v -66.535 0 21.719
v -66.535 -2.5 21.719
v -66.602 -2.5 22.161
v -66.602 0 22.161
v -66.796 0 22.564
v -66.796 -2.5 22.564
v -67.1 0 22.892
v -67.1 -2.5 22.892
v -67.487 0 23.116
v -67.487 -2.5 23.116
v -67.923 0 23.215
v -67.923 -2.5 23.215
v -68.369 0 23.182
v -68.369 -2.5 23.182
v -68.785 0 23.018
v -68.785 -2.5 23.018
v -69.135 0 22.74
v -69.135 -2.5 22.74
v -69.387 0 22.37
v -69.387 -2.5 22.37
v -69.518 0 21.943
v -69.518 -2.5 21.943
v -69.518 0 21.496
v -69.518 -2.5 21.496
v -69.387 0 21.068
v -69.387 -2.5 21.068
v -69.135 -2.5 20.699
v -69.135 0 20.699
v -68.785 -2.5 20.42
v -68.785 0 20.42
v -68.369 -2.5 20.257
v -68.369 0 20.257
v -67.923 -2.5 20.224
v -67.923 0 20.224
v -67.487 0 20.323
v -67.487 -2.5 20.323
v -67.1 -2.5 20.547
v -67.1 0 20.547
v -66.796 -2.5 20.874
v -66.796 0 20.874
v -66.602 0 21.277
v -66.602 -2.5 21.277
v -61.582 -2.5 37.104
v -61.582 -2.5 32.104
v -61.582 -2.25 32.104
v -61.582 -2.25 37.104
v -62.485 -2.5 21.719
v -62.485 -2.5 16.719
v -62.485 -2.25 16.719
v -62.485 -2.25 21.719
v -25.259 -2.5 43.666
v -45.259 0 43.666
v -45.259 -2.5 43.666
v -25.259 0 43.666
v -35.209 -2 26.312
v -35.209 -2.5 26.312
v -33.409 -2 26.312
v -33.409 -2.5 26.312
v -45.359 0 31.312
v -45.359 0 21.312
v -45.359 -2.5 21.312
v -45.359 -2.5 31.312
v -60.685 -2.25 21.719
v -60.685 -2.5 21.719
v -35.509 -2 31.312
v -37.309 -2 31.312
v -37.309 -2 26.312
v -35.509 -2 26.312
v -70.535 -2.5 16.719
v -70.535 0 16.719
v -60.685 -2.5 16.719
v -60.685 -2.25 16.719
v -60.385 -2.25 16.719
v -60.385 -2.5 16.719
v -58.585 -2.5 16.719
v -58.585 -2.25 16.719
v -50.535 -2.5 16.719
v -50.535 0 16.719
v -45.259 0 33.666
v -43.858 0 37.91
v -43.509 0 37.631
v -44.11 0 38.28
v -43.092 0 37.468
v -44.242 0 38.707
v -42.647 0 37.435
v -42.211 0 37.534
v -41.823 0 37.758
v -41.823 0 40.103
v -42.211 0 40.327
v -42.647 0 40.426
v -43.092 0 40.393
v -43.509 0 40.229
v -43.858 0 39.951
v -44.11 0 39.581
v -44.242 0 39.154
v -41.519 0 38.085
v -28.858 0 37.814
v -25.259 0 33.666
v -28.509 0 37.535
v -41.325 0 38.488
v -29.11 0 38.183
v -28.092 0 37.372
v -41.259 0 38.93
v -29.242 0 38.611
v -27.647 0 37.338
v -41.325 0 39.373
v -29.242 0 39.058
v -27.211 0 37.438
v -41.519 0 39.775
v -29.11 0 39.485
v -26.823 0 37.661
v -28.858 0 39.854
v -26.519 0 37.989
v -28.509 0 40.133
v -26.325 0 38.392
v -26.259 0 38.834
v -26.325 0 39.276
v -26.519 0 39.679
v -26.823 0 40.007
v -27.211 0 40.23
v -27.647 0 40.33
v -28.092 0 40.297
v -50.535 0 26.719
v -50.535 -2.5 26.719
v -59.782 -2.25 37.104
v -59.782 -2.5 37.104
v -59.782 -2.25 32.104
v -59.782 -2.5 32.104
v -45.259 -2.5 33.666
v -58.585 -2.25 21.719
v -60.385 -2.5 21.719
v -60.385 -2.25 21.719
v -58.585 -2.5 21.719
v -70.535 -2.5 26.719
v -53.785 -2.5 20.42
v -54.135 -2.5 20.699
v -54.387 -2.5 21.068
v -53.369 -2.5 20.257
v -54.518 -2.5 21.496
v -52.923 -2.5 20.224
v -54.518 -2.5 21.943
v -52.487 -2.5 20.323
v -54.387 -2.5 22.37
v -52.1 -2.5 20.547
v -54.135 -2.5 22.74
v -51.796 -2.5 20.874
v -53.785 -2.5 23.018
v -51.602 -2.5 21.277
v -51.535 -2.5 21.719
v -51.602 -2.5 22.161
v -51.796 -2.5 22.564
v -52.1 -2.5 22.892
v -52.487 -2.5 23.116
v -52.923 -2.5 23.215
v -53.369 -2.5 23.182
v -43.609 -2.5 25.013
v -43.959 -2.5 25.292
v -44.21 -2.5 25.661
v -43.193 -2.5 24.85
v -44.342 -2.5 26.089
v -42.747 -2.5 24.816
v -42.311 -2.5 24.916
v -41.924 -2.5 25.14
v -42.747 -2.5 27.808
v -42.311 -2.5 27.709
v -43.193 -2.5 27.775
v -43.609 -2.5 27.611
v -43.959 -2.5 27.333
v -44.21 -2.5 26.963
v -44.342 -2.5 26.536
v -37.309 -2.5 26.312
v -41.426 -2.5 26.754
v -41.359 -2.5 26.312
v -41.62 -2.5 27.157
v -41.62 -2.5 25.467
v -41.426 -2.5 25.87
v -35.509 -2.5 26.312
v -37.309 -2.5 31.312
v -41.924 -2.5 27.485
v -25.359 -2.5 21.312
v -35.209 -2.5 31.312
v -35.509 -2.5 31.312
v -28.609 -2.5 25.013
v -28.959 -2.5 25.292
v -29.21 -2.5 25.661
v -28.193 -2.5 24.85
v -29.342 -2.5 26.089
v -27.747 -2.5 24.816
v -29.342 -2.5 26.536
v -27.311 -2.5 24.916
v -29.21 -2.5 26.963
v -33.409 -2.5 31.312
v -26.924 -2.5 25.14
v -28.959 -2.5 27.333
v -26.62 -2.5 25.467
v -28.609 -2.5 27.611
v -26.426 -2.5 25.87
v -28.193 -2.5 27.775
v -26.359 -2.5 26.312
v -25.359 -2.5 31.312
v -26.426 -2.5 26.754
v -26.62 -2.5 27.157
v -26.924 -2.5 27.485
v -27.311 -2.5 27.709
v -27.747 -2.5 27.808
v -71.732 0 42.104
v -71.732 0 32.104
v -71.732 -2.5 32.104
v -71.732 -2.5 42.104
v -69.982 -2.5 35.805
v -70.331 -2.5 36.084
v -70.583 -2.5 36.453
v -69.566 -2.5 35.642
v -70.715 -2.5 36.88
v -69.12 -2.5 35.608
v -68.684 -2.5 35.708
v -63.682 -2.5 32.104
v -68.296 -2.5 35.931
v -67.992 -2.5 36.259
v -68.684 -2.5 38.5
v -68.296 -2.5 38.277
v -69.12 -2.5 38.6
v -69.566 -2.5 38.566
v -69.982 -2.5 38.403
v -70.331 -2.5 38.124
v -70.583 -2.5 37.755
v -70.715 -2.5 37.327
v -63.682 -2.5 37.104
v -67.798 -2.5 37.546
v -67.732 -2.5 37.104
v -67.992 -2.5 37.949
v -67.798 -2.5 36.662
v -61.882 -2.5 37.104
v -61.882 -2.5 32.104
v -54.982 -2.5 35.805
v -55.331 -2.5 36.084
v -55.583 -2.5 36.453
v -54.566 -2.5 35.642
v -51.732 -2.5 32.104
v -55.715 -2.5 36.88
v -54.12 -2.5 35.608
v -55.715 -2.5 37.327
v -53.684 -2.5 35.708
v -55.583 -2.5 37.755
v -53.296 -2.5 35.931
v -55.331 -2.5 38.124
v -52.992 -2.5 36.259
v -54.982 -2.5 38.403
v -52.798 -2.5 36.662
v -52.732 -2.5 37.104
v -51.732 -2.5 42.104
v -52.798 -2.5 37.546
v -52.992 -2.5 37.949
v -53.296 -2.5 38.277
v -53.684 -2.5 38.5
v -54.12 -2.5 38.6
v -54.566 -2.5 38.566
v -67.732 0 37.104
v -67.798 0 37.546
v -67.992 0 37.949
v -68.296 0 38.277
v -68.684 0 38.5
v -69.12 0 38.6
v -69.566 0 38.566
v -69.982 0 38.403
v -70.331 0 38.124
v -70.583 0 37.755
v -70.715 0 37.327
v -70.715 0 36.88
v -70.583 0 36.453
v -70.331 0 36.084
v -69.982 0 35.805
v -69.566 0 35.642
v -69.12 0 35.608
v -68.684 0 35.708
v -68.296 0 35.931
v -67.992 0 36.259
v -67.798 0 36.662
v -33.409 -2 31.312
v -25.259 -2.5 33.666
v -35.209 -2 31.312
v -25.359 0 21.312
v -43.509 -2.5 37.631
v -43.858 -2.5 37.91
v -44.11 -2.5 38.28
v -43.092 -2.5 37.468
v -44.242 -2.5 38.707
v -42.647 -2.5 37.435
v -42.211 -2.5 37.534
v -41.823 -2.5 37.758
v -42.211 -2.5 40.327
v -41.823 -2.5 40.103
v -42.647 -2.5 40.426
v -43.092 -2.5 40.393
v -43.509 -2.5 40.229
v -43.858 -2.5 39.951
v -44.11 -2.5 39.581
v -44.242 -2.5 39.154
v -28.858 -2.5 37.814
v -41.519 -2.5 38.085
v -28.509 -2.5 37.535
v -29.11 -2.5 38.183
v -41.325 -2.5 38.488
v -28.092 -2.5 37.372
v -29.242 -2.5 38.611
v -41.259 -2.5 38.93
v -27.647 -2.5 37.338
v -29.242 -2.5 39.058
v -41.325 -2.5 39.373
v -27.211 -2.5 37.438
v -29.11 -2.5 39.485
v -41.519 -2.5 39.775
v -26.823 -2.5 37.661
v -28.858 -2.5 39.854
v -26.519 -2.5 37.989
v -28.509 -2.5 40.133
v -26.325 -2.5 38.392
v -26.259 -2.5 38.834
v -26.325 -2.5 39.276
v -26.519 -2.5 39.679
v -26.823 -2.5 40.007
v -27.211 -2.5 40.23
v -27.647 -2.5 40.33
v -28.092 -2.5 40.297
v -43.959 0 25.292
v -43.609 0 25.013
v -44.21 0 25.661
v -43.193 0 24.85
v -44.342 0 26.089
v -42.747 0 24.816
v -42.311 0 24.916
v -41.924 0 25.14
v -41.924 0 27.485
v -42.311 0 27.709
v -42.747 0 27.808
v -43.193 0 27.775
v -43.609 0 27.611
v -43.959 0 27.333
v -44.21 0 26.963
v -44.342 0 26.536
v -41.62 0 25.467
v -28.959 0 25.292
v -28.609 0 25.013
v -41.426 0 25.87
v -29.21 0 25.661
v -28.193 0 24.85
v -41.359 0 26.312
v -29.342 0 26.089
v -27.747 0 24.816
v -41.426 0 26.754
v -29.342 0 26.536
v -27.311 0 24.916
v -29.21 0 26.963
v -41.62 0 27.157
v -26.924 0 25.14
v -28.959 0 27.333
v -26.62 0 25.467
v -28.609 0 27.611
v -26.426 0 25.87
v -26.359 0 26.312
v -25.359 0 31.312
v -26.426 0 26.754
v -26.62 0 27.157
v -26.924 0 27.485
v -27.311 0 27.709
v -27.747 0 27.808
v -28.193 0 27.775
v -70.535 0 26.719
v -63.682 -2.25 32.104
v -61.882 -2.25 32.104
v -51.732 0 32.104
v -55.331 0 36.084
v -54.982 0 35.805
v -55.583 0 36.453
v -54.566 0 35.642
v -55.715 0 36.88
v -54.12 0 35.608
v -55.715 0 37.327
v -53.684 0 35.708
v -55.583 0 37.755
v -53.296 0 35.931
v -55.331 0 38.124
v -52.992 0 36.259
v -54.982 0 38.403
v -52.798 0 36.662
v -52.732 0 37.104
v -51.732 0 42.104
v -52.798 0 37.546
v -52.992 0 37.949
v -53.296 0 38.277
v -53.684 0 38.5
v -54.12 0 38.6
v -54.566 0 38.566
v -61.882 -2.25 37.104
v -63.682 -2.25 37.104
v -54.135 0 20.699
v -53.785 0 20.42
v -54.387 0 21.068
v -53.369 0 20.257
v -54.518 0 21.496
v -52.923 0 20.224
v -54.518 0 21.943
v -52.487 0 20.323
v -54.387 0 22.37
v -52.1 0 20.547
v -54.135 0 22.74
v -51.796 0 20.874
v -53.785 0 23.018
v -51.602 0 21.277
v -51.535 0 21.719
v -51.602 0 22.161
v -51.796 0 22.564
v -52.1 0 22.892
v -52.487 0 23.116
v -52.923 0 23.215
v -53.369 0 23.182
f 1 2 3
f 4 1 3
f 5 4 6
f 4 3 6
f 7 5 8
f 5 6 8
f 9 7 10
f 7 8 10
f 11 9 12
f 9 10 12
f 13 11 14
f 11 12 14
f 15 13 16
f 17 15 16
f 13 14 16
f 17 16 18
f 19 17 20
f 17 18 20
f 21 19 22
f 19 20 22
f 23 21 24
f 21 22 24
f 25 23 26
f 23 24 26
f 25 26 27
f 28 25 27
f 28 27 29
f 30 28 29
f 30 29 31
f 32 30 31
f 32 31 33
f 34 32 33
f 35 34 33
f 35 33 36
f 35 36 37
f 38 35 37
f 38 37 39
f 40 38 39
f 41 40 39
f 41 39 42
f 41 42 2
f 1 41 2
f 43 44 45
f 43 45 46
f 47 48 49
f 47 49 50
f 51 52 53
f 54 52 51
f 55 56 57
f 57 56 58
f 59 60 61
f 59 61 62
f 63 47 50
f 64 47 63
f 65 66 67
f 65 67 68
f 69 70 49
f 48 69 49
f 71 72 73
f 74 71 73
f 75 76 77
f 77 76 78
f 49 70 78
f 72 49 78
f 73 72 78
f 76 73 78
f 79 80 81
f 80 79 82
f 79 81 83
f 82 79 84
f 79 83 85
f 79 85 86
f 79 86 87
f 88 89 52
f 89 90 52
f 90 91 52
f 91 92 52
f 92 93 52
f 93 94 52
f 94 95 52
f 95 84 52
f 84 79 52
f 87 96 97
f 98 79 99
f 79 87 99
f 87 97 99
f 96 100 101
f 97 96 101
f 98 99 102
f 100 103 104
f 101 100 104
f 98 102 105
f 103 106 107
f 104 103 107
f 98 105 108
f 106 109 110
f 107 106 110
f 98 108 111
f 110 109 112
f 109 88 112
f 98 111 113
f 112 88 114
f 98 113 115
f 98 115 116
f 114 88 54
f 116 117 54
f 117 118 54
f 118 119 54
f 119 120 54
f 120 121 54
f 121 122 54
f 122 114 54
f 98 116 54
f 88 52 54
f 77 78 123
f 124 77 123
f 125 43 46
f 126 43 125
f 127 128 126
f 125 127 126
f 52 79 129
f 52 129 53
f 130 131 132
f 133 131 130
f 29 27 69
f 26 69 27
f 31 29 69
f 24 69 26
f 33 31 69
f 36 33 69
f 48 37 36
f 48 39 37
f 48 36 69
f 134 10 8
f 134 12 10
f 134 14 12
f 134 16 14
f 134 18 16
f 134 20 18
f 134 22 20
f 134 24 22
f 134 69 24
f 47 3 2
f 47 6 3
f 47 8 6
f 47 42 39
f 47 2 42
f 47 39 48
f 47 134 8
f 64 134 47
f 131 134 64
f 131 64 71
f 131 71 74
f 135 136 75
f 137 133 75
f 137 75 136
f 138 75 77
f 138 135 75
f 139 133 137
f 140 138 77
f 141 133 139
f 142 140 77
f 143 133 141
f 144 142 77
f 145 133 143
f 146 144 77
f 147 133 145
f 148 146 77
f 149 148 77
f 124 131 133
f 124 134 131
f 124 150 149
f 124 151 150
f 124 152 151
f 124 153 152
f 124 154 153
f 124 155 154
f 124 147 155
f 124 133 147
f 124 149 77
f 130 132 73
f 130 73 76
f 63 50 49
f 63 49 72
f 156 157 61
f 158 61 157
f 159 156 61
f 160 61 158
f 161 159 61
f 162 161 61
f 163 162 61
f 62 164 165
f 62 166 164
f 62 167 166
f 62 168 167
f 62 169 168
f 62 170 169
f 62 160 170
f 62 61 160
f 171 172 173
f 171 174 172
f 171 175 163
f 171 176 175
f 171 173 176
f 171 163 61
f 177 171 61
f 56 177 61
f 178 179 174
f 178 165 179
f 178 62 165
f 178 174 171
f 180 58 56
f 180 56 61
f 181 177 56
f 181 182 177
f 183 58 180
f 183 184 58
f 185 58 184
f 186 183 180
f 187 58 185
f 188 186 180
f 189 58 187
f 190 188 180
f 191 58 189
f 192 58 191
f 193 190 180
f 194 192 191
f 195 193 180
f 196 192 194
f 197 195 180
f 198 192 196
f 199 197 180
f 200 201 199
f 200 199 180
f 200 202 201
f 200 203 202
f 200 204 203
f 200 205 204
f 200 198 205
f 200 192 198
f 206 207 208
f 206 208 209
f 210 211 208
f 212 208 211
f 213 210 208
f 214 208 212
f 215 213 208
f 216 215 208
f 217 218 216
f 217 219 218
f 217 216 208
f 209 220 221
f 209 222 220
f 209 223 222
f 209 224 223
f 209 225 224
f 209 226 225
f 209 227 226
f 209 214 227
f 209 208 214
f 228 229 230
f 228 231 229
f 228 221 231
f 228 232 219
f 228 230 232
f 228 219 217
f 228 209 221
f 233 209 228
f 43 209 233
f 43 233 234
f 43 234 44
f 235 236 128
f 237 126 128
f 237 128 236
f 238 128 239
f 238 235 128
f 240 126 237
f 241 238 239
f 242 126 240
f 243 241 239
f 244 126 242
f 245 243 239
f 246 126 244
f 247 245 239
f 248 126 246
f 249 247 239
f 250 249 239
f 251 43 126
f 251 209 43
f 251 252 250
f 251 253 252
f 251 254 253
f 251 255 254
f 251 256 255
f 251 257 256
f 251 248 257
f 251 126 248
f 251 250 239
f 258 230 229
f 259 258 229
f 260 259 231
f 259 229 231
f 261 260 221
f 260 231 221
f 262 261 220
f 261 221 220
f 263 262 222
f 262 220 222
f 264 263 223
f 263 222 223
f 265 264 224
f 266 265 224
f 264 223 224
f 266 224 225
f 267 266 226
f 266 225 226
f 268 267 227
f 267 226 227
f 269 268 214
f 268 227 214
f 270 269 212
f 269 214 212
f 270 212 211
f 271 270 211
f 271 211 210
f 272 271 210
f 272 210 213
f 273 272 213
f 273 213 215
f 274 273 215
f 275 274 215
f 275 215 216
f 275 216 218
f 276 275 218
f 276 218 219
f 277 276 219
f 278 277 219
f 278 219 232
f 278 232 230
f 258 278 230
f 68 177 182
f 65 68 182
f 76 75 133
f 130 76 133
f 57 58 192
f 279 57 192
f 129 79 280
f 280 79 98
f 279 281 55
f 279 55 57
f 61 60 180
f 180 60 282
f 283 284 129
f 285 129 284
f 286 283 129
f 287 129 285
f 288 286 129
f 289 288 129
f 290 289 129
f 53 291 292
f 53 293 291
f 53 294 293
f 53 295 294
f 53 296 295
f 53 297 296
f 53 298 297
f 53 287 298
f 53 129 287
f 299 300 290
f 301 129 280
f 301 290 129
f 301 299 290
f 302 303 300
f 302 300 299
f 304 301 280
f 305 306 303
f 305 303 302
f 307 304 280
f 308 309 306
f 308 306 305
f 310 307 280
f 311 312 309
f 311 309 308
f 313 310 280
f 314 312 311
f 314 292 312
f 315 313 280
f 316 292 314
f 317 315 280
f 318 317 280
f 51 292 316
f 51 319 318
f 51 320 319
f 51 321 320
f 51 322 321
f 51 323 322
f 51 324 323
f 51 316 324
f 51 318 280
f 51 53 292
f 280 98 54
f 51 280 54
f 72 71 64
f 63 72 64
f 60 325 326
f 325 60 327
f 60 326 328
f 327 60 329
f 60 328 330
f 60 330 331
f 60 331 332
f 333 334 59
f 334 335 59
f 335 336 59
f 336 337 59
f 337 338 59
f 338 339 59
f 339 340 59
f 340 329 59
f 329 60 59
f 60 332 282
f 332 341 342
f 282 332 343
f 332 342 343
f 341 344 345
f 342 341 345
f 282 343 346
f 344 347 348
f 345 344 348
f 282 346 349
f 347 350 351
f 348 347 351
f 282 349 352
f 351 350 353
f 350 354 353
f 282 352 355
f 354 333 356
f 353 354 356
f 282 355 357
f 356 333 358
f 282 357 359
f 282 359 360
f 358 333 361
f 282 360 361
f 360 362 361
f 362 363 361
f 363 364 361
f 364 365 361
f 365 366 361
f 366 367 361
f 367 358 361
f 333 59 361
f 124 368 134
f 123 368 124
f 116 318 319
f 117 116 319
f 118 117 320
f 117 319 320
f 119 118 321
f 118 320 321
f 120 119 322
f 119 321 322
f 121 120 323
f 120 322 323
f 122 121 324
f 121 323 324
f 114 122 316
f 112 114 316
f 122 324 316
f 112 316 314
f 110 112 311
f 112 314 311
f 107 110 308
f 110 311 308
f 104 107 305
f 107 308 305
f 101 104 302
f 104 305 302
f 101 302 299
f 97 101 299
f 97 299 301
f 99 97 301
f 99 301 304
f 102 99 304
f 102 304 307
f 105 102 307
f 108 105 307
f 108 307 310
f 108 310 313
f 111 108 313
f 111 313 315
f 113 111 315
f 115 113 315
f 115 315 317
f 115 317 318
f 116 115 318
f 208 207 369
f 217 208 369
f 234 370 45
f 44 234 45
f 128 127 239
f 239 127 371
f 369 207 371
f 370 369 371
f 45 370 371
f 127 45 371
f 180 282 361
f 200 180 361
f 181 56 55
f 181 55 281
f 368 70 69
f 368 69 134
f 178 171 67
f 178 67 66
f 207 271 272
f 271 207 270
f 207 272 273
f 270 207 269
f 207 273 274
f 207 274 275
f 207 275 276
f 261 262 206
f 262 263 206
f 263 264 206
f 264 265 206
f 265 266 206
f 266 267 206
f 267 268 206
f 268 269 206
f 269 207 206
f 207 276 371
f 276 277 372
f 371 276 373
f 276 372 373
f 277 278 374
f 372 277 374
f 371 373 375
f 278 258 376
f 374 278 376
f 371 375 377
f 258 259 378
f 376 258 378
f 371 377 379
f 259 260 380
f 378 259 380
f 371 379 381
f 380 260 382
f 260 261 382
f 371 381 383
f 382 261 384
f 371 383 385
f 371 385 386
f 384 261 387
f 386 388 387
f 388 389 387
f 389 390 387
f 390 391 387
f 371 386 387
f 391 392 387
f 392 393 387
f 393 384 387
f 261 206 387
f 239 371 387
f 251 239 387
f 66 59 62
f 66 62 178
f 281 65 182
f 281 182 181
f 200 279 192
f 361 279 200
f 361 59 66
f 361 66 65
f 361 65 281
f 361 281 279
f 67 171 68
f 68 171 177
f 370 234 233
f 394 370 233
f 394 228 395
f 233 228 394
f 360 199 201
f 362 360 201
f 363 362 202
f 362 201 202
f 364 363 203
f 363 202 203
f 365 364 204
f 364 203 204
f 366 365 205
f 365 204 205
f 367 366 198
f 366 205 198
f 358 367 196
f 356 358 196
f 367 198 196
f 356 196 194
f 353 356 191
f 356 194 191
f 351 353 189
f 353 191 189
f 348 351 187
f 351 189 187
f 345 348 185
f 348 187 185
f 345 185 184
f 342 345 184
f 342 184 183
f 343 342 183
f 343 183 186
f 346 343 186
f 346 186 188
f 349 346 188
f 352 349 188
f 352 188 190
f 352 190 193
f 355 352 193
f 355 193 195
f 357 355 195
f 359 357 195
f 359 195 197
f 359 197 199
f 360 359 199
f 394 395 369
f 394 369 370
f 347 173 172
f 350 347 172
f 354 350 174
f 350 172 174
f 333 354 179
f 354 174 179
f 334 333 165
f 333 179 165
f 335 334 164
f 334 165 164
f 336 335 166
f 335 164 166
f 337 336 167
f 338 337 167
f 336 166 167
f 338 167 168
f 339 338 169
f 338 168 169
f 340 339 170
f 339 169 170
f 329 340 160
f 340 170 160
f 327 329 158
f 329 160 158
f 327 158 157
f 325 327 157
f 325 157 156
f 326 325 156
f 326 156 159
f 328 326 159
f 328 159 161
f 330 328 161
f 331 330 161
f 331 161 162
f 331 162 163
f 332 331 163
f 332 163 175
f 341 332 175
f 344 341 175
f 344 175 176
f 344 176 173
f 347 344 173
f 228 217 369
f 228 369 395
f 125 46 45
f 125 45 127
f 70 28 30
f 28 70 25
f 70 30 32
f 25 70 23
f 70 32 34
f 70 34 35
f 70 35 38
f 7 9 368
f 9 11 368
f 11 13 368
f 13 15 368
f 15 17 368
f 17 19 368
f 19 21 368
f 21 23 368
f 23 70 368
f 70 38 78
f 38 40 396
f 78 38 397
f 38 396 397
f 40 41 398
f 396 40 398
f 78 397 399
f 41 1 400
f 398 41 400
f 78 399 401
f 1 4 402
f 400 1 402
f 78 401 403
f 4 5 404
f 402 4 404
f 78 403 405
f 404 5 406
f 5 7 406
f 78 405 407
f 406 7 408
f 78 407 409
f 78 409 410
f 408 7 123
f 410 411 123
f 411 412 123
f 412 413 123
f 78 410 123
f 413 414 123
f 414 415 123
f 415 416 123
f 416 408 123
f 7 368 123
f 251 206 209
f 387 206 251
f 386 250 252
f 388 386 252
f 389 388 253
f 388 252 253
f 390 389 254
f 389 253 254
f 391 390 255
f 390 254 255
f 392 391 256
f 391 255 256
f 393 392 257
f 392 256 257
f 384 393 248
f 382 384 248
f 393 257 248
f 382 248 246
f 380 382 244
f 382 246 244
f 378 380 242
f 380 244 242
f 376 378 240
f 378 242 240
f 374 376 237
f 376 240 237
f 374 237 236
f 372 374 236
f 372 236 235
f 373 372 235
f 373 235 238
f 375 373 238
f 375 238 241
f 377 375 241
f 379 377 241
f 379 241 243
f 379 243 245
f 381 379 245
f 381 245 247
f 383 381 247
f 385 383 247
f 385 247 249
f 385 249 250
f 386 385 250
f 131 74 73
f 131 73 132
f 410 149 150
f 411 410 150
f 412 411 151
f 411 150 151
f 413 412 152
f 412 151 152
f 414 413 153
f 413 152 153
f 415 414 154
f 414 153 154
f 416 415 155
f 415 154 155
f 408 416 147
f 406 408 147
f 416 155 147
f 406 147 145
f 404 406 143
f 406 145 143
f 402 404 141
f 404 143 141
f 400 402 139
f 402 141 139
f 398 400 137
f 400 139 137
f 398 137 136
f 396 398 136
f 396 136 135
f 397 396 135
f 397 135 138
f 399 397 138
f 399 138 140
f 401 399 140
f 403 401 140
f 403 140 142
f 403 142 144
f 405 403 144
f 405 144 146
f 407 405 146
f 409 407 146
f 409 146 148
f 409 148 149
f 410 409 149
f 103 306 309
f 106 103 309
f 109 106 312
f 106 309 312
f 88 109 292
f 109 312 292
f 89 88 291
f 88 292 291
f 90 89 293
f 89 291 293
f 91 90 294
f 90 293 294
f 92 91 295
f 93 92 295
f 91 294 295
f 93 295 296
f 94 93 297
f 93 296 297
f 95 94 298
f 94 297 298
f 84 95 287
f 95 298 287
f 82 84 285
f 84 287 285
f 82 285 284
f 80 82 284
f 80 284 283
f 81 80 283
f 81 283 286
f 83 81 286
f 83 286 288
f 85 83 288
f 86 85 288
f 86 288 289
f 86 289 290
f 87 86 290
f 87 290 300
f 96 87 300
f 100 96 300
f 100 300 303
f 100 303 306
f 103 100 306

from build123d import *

# Parameters (mm, degrees)
F0_W      = 20
F0_H      = 10
F1_DEPTH  = 2.5
F2_W      = 1.8
F2_H      = 5.579838
F2_H_2    = 5.767533
F3_DEPTH  = 0.5
F4_R      = 1.5
F5_DEPTH  = 3
F6_R      = 1.5
F7_DEPTH  = 3
F8_W      = 20
F8_H      = 10
F9_DEPTH  = 2.5
F10_W     = 1.8
F10_H     = 5
F11_DEPTH = 0.25
F12_W     = 1.8
F12_H     = 5
F13_DEPTH = 0.25
F14_R     = 1.5
F15_DEPTH = 3
F16_R     = 1.5
F17_DEPTH = 3


with BuildPart() as f1:
    # F0 (on Front) → F1 (new body)
    with BuildSketch(Plane.XZ):
        with Locations((-35.258645, 38.665584)):
            Rectangle(F0_W, F0_H)
        with Locations((-35.358997, 26.312298)):
            Rectangle(F0_W, F0_H)
    extrude(amount=F1_DEPTH)

    # F2 (on face) → F3 (cut)
    with BuildSketch(Plane.XZ.offset(2.5)):
        with Locations((-36.408997, 29.102217)):
            Rectangle(F2_W, F2_H)
        with Locations((-34.308997, 29.196064)):
            Rectangle(F2_W, F2_H_2)
    extrude(amount=-F3_DEPTH, mode=Mode.SUBTRACT)

    # F4 (on face) → F5 (cut)
    with BuildSketch(Plane.XZ.offset(2.5)):
        with Locations((-42.858997, 26.312298)):
            Circle(F4_R)
        with Locations((-27.858997, 26.312298)):
            Circle(F4_R)
    extrude(amount=-F5_DEPTH, mode=Mode.SUBTRACT)

    # F6 (on face) → F7 (cut)
    with BuildSketch(Plane.XZ.offset(2.5)):
        with Locations((-42.758645, 38.930405)):
            Circle(F6_R)
        with Locations((-27.758645, 38.834177)):
            Circle(F6_R)
    extrude(amount=-F7_DEPTH, mode=Mode.SUBTRACT)


with BuildPart() as f9:
    # F8 (on Front) → F9 (new body)
    with BuildSketch(Plane.XZ):
        with Locations((-61.731721, 37.103924)):
            Rectangle(F8_W, F8_H)
        with Locations((-60.535134, 21.719313)):
            Rectangle(F8_W, F8_H)
    extrude(amount=F9_DEPTH)

    # F10 (on face) → F11 (cut)
    with BuildSketch(Plane.XZ.offset(2.5)):
        with Locations((-62.781721, 34.603924)):
            Rectangle(F10_W, F10_H)
        with Locations((-60.681721, 34.603924)):
            Rectangle(F10_W, F10_H)
    extrude(amount=-F11_DEPTH, mode=Mode.SUBTRACT)

    # F12 (on face) → F13 (cut)
    with BuildSketch(Plane.XZ.offset(2.5)):
        with Locations((-61.585134, 19.219313)):
            Rectangle(F12_W, F12_H)
        with Locations((-59.485134, 19.219313)):
            Rectangle(F12_W, F12_H)
    extrude(amount=-F13_DEPTH, mode=Mode.SUBTRACT)

    # F14 (on face) → F15 (cut)
    with BuildSketch(Plane.XZ.offset(2.5)):
        with Locations((-69.231721, 37.103924)):
            Circle(F14_R)
        with Locations((-54.231721, 37.103924)):
            Circle(F14_R)
    extrude(amount=-F15_DEPTH, mode=Mode.SUBTRACT)

    # F16 (on face) → F17 (cut)
    with BuildSketch(Plane.XZ.offset(2.5)):
        with Locations((-68.035134, 21.719313)):
            Circle(F16_R)
        with Locations((-53.035134, 21.719313)):
            Circle(F16_R)
    extrude(amount=-F17_DEPTH, mode=Mode.SUBTRACT)


solid = Compound([f1.part, f9.part])
